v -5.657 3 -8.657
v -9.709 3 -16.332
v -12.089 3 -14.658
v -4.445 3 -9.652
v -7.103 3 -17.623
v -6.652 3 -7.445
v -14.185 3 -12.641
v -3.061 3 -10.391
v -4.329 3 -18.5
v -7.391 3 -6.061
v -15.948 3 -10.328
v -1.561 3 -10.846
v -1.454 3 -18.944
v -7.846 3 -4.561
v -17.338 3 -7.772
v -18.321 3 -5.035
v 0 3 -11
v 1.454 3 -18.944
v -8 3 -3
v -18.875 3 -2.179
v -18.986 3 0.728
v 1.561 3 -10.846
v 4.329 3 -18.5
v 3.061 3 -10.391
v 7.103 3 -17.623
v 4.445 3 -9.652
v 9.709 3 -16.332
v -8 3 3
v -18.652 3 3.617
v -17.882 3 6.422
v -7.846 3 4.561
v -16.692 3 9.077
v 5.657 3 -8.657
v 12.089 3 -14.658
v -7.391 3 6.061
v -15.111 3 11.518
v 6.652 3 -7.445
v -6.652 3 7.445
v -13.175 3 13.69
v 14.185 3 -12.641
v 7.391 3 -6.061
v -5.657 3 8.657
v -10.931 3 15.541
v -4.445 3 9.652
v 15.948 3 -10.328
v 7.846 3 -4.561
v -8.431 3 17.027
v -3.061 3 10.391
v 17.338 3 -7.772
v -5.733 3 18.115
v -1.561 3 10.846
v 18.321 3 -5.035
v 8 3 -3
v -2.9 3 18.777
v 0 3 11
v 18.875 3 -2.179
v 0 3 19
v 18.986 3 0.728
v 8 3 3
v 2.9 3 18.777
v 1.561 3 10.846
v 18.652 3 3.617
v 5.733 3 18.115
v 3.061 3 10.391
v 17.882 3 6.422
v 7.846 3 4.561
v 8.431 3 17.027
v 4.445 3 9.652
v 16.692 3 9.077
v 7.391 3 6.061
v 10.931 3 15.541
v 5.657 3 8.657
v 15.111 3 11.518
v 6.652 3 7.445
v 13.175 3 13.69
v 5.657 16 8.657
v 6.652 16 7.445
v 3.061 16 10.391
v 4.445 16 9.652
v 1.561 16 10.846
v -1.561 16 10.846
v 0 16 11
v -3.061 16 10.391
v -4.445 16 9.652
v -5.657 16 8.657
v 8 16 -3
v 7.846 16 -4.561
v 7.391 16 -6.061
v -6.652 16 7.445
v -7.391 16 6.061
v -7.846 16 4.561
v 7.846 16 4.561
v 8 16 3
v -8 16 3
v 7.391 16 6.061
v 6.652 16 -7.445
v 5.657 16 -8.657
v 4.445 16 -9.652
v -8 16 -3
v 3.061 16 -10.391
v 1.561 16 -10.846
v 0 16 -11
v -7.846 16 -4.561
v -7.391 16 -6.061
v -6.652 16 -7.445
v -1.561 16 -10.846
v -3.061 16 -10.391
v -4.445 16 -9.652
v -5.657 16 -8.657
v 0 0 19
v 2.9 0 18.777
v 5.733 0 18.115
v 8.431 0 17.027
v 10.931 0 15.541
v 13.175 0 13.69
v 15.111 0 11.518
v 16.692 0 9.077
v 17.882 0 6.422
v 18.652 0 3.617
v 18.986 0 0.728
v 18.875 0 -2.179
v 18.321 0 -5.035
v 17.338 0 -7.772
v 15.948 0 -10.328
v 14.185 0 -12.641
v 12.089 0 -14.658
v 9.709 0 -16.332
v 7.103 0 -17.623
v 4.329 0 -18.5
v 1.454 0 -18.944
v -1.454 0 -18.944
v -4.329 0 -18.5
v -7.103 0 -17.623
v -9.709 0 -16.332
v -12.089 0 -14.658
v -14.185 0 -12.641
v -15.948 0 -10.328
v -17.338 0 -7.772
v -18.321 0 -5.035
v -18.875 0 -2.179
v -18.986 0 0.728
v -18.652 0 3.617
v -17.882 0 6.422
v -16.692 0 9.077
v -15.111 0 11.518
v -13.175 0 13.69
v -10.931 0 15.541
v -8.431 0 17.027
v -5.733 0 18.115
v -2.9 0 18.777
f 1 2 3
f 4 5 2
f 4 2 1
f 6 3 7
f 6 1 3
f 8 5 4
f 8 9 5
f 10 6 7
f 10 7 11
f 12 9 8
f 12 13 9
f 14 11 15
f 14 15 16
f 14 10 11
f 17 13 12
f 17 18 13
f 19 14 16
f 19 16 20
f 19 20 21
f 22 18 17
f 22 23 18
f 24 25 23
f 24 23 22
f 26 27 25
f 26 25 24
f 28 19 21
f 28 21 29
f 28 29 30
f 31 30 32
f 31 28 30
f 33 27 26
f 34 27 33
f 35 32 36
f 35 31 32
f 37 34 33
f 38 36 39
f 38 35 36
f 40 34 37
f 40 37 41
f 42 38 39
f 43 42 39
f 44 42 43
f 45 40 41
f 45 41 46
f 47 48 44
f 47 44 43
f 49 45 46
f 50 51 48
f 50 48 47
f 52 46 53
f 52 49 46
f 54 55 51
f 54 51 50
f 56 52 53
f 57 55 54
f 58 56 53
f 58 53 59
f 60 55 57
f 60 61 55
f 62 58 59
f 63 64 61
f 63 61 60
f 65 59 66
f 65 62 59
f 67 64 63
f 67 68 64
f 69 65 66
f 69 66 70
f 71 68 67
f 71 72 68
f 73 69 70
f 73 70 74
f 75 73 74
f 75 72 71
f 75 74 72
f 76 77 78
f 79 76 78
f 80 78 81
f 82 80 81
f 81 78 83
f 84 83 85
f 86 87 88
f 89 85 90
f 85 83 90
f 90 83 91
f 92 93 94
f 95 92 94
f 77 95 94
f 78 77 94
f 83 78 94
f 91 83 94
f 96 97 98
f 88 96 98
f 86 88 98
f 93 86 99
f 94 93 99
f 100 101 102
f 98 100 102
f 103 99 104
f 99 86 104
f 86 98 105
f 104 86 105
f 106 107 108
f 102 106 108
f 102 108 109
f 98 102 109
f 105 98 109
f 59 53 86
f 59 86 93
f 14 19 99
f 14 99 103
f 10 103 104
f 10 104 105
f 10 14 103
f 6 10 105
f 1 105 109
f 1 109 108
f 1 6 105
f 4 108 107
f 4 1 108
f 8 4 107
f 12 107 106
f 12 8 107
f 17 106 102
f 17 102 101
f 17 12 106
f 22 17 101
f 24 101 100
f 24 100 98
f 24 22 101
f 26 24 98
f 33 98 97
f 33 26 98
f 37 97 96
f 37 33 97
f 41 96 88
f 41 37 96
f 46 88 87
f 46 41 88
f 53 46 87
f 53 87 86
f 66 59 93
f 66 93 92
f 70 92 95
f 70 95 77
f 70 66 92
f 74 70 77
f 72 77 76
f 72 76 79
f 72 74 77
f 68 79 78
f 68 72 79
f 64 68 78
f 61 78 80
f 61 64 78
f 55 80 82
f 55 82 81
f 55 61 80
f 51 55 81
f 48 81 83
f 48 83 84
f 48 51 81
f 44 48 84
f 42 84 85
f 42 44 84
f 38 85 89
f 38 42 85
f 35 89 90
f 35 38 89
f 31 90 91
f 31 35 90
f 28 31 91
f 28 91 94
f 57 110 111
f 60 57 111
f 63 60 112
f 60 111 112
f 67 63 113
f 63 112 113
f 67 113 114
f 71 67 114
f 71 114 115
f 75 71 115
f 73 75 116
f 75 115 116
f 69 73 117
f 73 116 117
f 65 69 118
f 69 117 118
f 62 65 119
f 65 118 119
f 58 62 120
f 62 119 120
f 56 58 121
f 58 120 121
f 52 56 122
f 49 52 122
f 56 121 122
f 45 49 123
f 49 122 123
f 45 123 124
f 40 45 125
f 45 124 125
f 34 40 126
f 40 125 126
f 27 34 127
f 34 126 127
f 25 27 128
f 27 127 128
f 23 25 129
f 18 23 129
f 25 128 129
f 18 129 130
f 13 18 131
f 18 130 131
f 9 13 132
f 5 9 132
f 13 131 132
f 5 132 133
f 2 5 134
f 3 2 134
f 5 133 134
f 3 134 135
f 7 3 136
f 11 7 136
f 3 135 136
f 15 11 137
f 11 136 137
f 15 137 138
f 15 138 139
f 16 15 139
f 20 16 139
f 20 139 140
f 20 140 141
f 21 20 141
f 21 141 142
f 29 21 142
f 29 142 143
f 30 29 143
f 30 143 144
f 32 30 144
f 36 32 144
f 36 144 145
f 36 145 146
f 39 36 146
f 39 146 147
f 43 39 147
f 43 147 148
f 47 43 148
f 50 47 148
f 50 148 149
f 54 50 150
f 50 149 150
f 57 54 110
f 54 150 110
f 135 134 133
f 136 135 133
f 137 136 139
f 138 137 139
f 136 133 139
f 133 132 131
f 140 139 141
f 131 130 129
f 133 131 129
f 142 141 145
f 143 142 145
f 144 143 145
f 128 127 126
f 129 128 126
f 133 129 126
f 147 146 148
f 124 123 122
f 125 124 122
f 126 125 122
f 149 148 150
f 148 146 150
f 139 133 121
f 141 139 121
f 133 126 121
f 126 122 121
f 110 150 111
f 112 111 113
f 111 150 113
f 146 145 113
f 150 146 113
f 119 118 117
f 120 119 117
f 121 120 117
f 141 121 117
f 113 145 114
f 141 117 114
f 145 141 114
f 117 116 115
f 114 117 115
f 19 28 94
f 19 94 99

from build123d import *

# Parameters (mm, degrees)
SKETCH1_R           = 19
BOSS_EXTRUDE1_DEPTH = 3
BOSS_EXTRUDE2_DEPTH = 13


with BuildPart() as part:
    # Sketch1 → Boss-Extrude1 (new body)
    with BuildSketch(Plane(origin=(0, 0, 0), x_dir=(1, 0, 0), z_dir=(0, 1, 0))):
        with Locations(Location((0, 0, 0), (0, 0, 270))):  # turned: the seam where the file's is
            Circle(SKETCH1_R)
    extrude(amount=BOSS_EXTRUDE1_DEPTH)

    # Sketch2 → Boss-Extrude2 (add)
    with BuildSketch(Plane(origin=(0, 3, 0), x_dir=(1, 0, 0), z_dir=(0, 1, 0))):
        with BuildLine():
            Line((-8, -3), (-8, 3))
            ThreePointArc((-8, 3), (0, 11), (8, 3))
            Line((8, 3), (8, -3))
            ThreePointArc((8, -3), (0, -11), (-8, -3))
        make_face()
    extrude(amount=BOSS_EXTRUDE2_DEPTH)


solid = part.part
